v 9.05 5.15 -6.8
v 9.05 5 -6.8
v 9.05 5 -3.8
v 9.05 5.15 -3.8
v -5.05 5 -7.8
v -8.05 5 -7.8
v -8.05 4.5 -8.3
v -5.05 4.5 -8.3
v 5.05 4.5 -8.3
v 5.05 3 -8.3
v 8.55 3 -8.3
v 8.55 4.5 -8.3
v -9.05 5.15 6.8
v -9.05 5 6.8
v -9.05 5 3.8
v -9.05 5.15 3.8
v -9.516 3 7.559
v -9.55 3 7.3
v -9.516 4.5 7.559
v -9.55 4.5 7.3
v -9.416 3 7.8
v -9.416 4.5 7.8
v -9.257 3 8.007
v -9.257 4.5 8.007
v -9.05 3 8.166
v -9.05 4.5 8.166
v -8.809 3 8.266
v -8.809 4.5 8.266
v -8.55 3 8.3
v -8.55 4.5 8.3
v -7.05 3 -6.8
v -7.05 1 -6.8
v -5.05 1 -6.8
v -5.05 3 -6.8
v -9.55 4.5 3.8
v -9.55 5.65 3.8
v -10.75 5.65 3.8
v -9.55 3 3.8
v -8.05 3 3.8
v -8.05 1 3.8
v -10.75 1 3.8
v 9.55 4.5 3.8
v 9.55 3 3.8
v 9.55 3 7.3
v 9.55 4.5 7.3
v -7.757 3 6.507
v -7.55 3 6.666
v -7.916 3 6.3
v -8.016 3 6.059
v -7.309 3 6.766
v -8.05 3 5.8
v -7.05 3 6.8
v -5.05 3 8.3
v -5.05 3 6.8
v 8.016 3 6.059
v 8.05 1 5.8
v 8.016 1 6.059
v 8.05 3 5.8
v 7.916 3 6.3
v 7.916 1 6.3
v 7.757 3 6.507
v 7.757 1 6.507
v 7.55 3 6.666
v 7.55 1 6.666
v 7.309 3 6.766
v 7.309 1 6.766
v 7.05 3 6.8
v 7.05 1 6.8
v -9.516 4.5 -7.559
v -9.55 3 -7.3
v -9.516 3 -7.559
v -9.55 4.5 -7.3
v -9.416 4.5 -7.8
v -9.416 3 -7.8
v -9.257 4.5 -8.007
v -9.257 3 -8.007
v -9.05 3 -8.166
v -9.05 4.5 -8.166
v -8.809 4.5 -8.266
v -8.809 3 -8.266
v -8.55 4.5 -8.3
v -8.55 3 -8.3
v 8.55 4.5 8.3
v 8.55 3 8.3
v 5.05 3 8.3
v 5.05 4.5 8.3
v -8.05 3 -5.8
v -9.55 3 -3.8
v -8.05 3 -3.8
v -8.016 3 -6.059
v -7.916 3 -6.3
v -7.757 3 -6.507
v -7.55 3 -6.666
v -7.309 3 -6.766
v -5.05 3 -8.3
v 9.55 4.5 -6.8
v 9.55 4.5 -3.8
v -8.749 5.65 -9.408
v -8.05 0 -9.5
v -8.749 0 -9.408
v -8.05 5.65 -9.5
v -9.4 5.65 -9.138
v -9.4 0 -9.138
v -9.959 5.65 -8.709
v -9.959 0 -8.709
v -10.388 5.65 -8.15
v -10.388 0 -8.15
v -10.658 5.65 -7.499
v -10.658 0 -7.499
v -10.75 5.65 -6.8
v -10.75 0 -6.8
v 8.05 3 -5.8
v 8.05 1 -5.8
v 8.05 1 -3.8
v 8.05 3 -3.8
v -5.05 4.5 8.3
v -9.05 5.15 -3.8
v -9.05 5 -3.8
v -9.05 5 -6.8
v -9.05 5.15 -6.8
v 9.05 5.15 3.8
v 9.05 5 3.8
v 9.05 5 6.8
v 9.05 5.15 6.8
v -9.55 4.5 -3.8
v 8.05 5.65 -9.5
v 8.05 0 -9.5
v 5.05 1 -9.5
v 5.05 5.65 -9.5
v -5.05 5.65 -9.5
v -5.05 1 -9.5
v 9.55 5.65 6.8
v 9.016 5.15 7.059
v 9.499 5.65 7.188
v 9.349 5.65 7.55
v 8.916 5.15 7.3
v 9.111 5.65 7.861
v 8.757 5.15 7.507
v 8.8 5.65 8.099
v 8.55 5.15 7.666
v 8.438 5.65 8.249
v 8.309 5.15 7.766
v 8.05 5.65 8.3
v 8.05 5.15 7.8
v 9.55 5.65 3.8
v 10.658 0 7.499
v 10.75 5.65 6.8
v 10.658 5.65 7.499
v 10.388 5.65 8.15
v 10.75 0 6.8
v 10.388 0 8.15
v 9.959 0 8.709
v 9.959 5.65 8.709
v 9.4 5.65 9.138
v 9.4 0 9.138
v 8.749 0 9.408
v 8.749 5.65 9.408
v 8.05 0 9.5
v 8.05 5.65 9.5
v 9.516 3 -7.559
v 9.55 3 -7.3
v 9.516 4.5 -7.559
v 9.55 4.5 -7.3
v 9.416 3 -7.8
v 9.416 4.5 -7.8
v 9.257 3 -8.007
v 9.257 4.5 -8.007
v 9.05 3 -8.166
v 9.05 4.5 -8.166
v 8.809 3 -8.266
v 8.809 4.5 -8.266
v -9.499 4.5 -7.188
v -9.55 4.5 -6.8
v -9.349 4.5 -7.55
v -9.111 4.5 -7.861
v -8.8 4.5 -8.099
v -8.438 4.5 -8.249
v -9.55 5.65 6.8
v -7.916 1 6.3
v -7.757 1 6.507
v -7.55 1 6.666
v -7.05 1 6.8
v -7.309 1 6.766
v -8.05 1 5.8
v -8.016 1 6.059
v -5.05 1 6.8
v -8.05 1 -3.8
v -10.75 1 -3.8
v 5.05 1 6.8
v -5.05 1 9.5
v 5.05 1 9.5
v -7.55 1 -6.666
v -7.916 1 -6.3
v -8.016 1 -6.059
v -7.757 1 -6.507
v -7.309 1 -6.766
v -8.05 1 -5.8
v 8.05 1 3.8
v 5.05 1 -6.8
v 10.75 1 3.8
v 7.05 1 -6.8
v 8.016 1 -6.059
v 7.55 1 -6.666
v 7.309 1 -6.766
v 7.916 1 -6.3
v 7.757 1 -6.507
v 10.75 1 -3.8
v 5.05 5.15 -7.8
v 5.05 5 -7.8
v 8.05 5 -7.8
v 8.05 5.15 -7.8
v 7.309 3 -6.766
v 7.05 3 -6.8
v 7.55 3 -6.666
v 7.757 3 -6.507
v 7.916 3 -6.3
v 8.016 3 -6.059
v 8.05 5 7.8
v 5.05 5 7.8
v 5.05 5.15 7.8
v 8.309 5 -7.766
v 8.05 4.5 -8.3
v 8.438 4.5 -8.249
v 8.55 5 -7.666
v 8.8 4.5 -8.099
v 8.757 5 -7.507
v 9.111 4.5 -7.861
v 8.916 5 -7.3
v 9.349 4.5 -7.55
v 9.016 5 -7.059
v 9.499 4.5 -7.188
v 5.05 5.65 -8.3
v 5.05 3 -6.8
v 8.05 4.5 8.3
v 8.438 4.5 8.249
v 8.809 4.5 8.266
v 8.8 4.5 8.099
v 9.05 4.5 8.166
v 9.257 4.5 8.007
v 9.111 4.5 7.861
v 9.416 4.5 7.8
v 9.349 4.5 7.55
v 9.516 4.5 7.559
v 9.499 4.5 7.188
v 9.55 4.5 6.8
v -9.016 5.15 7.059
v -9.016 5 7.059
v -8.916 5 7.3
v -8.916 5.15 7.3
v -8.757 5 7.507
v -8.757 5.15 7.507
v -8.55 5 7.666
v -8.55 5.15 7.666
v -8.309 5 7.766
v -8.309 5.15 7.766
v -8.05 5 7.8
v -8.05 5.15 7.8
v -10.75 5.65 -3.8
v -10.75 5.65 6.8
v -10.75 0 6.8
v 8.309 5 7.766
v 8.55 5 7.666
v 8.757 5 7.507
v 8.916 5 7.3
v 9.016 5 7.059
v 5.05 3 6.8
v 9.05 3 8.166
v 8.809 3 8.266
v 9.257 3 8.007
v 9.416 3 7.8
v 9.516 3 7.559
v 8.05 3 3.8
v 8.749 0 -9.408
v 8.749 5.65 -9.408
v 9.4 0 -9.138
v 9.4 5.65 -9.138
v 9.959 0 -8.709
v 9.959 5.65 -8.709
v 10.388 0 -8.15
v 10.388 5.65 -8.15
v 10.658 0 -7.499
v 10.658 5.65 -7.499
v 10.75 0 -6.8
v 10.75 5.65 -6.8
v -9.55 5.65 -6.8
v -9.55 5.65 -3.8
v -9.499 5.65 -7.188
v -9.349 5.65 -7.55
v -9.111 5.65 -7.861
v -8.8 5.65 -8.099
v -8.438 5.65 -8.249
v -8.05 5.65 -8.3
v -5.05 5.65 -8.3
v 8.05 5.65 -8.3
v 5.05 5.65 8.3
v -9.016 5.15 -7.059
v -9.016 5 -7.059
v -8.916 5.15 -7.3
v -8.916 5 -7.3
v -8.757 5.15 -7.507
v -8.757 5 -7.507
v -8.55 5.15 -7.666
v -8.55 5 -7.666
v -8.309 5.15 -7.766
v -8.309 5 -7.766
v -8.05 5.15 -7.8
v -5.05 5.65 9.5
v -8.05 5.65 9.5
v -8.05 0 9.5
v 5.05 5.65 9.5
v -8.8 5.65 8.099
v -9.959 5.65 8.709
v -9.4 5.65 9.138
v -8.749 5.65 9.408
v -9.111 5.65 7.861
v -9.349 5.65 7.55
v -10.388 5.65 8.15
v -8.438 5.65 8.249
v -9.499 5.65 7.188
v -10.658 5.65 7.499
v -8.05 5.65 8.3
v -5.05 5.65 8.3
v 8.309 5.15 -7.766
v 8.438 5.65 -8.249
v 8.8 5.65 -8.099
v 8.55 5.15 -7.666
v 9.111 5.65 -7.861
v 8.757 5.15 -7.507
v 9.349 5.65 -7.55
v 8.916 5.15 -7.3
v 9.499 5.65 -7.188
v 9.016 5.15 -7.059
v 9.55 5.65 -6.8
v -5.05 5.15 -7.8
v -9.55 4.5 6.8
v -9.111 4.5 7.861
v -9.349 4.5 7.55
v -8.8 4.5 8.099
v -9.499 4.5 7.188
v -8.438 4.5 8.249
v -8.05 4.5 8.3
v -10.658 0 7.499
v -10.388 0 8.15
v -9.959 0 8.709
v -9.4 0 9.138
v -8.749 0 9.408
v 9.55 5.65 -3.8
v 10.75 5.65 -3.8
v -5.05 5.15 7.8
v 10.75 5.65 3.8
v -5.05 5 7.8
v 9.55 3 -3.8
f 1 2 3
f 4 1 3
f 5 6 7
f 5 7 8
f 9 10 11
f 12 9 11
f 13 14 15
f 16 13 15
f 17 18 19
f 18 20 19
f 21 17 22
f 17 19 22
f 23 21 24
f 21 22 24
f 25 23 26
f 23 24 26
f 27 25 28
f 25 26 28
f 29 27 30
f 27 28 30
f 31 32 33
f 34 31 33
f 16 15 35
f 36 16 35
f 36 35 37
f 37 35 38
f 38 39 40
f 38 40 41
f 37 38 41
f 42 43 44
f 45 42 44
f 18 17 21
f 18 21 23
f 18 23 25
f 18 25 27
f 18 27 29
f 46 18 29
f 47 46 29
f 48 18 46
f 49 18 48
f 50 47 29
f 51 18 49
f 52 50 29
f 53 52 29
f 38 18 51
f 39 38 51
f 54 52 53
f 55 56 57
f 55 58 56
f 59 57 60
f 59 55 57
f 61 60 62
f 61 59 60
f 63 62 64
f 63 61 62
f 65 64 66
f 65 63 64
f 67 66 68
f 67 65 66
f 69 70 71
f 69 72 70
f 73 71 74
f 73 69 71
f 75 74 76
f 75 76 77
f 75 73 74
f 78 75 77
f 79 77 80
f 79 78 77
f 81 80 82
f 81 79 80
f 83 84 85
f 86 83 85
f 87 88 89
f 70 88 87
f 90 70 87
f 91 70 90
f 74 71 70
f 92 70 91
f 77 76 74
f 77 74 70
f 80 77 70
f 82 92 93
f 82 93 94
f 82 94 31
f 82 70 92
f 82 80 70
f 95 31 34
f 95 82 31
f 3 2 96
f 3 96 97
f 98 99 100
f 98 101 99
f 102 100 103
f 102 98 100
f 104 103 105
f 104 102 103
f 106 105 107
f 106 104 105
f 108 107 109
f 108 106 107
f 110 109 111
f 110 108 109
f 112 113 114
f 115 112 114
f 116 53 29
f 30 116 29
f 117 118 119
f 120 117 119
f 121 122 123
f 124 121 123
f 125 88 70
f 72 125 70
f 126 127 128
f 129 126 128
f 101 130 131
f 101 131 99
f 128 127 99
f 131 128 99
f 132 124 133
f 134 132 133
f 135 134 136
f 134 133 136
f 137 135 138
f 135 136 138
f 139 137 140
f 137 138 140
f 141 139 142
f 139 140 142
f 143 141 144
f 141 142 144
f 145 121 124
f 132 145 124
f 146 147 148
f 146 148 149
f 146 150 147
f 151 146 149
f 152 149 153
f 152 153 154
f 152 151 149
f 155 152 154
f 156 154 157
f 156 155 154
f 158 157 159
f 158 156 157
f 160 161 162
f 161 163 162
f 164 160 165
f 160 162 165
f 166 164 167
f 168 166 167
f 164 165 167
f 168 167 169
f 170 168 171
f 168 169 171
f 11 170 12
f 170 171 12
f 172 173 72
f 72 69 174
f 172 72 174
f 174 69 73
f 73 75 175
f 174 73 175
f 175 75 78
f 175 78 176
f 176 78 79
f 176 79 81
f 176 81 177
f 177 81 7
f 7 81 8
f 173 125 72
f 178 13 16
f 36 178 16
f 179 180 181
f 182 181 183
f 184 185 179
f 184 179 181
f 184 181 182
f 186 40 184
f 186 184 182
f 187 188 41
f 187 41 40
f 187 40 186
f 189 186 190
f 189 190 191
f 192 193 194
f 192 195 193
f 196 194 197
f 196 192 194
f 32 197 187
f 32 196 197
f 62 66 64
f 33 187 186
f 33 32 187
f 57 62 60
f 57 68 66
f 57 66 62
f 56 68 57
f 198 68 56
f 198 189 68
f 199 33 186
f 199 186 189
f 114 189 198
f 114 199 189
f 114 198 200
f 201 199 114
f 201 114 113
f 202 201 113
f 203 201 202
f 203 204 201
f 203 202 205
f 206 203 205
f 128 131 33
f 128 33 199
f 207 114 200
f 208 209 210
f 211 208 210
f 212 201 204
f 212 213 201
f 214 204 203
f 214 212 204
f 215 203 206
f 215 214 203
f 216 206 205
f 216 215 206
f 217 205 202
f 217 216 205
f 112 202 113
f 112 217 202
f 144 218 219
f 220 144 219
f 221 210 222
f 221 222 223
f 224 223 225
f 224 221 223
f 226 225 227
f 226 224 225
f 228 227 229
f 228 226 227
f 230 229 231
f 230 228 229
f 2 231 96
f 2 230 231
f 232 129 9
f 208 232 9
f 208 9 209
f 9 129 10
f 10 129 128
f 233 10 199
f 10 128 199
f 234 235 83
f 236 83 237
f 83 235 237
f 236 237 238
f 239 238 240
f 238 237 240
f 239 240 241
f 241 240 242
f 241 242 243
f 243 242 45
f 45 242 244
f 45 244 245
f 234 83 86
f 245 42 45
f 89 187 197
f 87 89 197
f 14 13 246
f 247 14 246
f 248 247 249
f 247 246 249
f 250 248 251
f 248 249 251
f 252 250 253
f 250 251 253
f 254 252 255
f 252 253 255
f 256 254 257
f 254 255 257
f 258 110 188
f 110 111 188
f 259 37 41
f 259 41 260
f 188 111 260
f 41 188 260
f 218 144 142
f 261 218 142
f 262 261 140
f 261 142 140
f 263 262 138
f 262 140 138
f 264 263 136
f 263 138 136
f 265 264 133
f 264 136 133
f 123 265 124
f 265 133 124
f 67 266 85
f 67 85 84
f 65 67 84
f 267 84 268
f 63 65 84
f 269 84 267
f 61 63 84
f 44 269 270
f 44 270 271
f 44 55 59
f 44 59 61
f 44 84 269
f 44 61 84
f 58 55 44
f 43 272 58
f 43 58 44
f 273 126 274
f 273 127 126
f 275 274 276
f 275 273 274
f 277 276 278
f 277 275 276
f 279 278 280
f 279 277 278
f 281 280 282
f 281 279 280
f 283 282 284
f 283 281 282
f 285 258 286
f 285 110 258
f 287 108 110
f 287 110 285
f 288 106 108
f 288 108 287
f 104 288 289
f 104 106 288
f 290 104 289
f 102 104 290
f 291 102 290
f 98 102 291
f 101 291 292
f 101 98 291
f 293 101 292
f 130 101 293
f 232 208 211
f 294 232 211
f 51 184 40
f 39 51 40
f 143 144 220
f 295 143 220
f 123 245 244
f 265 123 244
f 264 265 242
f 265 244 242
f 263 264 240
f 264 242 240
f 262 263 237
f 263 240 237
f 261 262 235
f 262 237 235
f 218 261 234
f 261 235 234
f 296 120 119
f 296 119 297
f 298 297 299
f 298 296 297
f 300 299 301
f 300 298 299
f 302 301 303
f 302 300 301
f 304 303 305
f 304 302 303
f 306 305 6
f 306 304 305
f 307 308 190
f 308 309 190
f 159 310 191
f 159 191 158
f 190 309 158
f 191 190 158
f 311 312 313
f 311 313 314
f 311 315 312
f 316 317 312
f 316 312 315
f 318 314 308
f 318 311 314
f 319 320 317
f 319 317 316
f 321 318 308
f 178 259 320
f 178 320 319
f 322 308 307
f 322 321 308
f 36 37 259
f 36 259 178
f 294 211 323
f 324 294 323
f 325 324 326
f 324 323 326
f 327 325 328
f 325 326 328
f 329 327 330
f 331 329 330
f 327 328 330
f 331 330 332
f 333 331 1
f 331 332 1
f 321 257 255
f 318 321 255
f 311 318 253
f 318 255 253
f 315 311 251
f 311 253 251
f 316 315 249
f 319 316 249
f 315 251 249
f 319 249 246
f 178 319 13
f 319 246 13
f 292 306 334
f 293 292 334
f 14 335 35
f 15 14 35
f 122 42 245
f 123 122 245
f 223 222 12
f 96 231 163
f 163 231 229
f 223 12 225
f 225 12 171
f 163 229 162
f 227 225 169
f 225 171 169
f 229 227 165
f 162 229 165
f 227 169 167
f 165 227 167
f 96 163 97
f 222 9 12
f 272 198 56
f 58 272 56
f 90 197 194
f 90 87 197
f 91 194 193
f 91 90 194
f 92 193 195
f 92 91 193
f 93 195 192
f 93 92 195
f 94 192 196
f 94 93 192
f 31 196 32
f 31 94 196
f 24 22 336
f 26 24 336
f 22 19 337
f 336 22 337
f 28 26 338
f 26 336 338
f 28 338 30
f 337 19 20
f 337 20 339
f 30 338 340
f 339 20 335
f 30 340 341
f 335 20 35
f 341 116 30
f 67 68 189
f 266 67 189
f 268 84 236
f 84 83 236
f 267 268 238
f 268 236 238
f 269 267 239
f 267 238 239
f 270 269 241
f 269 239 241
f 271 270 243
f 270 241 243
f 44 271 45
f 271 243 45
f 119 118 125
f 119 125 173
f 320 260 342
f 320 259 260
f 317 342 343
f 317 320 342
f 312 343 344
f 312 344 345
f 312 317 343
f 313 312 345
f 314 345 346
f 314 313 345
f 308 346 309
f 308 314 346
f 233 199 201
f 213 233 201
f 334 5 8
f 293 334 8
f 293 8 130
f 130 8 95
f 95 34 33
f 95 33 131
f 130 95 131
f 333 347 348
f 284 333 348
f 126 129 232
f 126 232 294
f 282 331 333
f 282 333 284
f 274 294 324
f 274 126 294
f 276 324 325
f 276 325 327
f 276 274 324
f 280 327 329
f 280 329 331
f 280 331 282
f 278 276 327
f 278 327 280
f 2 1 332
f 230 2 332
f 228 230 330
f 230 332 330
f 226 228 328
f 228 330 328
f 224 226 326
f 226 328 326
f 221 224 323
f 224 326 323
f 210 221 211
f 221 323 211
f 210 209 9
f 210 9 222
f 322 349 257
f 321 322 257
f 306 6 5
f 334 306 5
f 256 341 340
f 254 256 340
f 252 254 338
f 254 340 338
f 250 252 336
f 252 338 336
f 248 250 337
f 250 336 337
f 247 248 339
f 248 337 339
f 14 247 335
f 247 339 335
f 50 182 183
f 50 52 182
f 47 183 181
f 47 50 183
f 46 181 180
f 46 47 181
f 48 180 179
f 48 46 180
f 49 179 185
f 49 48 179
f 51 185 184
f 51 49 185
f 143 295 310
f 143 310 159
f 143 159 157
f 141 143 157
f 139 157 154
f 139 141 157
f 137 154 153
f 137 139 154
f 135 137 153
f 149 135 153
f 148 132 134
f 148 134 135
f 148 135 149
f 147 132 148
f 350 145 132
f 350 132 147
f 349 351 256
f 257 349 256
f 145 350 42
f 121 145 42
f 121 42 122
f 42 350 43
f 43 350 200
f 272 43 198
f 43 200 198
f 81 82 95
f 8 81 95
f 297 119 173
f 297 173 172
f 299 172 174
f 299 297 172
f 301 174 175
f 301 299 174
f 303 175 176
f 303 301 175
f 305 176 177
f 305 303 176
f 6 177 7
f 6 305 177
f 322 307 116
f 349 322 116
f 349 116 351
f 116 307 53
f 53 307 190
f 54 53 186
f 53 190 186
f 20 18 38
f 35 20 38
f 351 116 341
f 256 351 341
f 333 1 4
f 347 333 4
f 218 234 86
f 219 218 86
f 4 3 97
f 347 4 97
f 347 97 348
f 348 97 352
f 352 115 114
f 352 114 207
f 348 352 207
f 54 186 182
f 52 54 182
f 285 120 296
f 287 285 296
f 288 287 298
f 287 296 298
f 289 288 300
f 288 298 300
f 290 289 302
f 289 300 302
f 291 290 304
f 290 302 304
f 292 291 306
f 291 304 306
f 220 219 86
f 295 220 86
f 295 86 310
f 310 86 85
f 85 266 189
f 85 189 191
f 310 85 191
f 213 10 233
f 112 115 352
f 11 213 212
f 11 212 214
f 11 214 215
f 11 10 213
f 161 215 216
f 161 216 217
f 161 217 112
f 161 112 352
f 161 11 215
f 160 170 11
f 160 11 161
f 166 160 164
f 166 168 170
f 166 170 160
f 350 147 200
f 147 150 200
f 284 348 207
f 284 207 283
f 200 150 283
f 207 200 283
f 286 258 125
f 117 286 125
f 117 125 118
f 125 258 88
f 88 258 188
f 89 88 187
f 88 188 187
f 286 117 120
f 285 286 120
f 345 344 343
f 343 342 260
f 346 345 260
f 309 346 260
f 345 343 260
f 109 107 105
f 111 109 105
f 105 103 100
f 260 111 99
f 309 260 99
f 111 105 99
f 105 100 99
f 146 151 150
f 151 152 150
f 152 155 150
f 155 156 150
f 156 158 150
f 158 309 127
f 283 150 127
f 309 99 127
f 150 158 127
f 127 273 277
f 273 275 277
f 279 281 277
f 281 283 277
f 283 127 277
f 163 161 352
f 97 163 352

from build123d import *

# Parameters (mm, degrees)
SKETCH1_W              = 21.5
SKETCH1_H              = 19
COMBINE_BASE_DEPTH     = 1
STAND_OFFS_DEPTH       = 2
PCB_CONTAINERS_DEPTH   = 1.5
SNAP_INS_DEPTH         = 1.15
INSIDE_FILLETS_R       = 1
OUTSIDE_FILLETS_R      = 2.7
CLICK_IN_CHAMFERS_SIZE = 0.5
PULL_OUT_CHAMFERS_SIZE = 0.5


with BuildPart() as part:
    # Sketch1 → Combine Base (new body)
    with BuildSketch(Plane(origin=(0, 0, 0), x_dir=(1, 0, 0), z_dir=(0, 1, 0))):
        Rectangle(SKETCH1_W, SKETCH1_H)
    extrude(amount=COMBINE_BASE_DEPTH)

    # Sketch4 → Stand offs (add)
    with BuildSketch(Plane(origin=(0, 1, 0), x_dir=(1, 0, 0), z_dir=(0, 1, 0))):
        Polygon((-10.75, 3.8), (-8.05, 3.8), (-8.05, 6.8), (-5.05, 6.8), (-5.05, 9.5), (-10.75, 9.5), align=None)
        Polygon((-8.05, -3.8), (-10.75, -3.8), (-10.75, -9.5), (-5.05, -9.5), (-5.05, -6.8), (-8.05, -6.8), align=None)
        Polygon((5.05, -6.8), (5.05, -9.5), (10.75, -9.5), (10.75, -3.8), (8.05, -3.8), (8.05, -6.8), align=None)
        Polygon((10.75, 9.5), (5.05, 9.5), (5.05, 6.8), (8.05, 6.8), (8.05, 3.8), (10.75, 3.8), align=None)
    extrude(amount=STAND_OFFS_DEPTH)

    # Sketch5 → PCB Containers (add)
    with BuildSketch(Plane(origin=(0, 3, 0), x_dir=(1, 0, 0), z_dir=(0, 1, 0))):
        Polygon((-10.75, 3.8), (-9.55, 3.8), (-9.55, 8.3), (-5.05, 8.3), (-5.05, 9.5), (-10.75, 9.5), align=None)
        Polygon((9.55, 8.3), (9.55, 3.8), (10.75, 3.8), (10.75, 9.5), (5.05, 9.5), (5.05, 8.3), align=None)
        Polygon((9.55, -8.3), (5.05, -8.3), (5.05, -9.5), (10.75, -9.5), (10.75, -3.8), (9.55, -3.8), align=None)
        Polygon((-10.75, -9.5), (-5.05, -9.5), (-5.05, -8.3), (-9.55, -8.3), (-9.55, -3.8), (-10.75, -3.8), align=None)
    extrude(amount=PCB_CONTAINERS_DEPTH)

    # Sketch6 → Snap Ins (add)
    with BuildSketch(Plane(origin=(0, 4.5, 0), x_dir=(1, 0, 0), z_dir=(0, 1, 0))):
        Polygon((-5.05, 7.8), (-5.05, 9.5), (-10.75, 9.5), (-10.75, 3.8), (-9.05, 3.8), (-9.05, 7.8), align=None)
        Polygon((-9.05, -3.8), (-10.75, -3.8), (-10.75, -9.5), (-5.05, -9.5), (-5.05, -7.8), (-9.05, -7.8), align=None)
        Polygon((10.75, -9.5), (10.75, -3.8), (9.05, -3.8), (9.05, -7.8), (5.05, -7.8), (5.05, -9.5), align=None)
        Polygon((10.75, 9.5), (5.05, 9.5), (5.05, 7.8), (9.05, 7.8), (9.05, 3.8), (10.75, 3.8), align=None)
    extrude(amount=SNAP_INS_DEPTH)

    # Inside Fillets
    inside_fillets_edges = [part.edges().sort_by_distance(p)[0] for p in [
        (9.55, 3.75, -8.3),
        (9.55, 3.75, 8.3),
        (-9.55, 3.75, 8.3),
        (-9.05, 5.075, 7.8),
        (9.05, 5.075, 7.8),
        (-8.05, 2, -6.8),
        (9.05, 5.075, -7.8),
        (-9.05, 5.075, -7.8),
        (-8.05, 2, 6.8),
        (8.05, 2, 6.8),
        (8.05, 2, -6.8),
        (-9.55, 3.75, -8.3),
    ]]
    fillet(inside_fillets_edges, radius=INSIDE_FILLETS_R)

    # Outside Fillets
    outside_fillets_edges = [part.edges().sort_by_distance(p)[0] for p in [
        (10.75, 2.825, 9.5),
        (-10.75, 2.825, 9.5),
        (-10.75, 2.825, -9.5),
        (10.75, 2.825, -9.5),
    ]]
    fillet(outside_fillets_edges, radius=OUTSIDE_FILLETS_R)

    # Click in Chamfers
    click_in_chamfers_edges = [part.edges().sort_by_distance(p)[0] for p in [
        (-9.05, 5.65, 5.3),
        (9.05, 5.65, 5.3),
        (6.55, 5.65, -7.8),
        (-9.05, 5.65, -5.3),
        (6.55, 5.65, 7.8),
        (-6.55, 5.65, 7.8),
        (-6.55, 5.65, -7.8),
        (9.05, 5.65, -5.3),
        (8.757106781, 5.65, 7.507106781),
        (-8.757106781, 5.65, 7.507106781),
        (-8.757106781, 5.65, -7.507106781),
        (8.757106781, 5.65, -7.507106781),
    ]]
    chamfer(click_in_chamfers_edges, length=CLICK_IN_CHAMFERS_SIZE)

    # Pull out Chamfers
    pull_out_chamfers_edges = [part.edges().sort_by_distance(p)[0] for p in [
        (-6.55, 4.5, -7.8),
        (-9.05, 4.5, -5.3),
        (-8.757106781, 4.5, -7.507106781),
        (9.05, 4.5, -5.3),
        (6.55, 4.5, -7.8),
        (8.757106781, 4.5, -7.507106781),
        (6.55, 4.5, 7.8),
        (9.05, 4.5, 5.3),
        (8.757106781, 4.5, 7.507106781),
        (-9.05, 4.5, 5.3),
        (-6.55, 4.5, 7.8),
        (-8.757106781, 4.5, 7.507106781),
    ]]
    chamfer(pull_out_chamfers_edges, length=PULL_OUT_CHAMFERS_SIZE - 0.0001)  # a hair under: the kernel refuses the full size


solid = part.part
